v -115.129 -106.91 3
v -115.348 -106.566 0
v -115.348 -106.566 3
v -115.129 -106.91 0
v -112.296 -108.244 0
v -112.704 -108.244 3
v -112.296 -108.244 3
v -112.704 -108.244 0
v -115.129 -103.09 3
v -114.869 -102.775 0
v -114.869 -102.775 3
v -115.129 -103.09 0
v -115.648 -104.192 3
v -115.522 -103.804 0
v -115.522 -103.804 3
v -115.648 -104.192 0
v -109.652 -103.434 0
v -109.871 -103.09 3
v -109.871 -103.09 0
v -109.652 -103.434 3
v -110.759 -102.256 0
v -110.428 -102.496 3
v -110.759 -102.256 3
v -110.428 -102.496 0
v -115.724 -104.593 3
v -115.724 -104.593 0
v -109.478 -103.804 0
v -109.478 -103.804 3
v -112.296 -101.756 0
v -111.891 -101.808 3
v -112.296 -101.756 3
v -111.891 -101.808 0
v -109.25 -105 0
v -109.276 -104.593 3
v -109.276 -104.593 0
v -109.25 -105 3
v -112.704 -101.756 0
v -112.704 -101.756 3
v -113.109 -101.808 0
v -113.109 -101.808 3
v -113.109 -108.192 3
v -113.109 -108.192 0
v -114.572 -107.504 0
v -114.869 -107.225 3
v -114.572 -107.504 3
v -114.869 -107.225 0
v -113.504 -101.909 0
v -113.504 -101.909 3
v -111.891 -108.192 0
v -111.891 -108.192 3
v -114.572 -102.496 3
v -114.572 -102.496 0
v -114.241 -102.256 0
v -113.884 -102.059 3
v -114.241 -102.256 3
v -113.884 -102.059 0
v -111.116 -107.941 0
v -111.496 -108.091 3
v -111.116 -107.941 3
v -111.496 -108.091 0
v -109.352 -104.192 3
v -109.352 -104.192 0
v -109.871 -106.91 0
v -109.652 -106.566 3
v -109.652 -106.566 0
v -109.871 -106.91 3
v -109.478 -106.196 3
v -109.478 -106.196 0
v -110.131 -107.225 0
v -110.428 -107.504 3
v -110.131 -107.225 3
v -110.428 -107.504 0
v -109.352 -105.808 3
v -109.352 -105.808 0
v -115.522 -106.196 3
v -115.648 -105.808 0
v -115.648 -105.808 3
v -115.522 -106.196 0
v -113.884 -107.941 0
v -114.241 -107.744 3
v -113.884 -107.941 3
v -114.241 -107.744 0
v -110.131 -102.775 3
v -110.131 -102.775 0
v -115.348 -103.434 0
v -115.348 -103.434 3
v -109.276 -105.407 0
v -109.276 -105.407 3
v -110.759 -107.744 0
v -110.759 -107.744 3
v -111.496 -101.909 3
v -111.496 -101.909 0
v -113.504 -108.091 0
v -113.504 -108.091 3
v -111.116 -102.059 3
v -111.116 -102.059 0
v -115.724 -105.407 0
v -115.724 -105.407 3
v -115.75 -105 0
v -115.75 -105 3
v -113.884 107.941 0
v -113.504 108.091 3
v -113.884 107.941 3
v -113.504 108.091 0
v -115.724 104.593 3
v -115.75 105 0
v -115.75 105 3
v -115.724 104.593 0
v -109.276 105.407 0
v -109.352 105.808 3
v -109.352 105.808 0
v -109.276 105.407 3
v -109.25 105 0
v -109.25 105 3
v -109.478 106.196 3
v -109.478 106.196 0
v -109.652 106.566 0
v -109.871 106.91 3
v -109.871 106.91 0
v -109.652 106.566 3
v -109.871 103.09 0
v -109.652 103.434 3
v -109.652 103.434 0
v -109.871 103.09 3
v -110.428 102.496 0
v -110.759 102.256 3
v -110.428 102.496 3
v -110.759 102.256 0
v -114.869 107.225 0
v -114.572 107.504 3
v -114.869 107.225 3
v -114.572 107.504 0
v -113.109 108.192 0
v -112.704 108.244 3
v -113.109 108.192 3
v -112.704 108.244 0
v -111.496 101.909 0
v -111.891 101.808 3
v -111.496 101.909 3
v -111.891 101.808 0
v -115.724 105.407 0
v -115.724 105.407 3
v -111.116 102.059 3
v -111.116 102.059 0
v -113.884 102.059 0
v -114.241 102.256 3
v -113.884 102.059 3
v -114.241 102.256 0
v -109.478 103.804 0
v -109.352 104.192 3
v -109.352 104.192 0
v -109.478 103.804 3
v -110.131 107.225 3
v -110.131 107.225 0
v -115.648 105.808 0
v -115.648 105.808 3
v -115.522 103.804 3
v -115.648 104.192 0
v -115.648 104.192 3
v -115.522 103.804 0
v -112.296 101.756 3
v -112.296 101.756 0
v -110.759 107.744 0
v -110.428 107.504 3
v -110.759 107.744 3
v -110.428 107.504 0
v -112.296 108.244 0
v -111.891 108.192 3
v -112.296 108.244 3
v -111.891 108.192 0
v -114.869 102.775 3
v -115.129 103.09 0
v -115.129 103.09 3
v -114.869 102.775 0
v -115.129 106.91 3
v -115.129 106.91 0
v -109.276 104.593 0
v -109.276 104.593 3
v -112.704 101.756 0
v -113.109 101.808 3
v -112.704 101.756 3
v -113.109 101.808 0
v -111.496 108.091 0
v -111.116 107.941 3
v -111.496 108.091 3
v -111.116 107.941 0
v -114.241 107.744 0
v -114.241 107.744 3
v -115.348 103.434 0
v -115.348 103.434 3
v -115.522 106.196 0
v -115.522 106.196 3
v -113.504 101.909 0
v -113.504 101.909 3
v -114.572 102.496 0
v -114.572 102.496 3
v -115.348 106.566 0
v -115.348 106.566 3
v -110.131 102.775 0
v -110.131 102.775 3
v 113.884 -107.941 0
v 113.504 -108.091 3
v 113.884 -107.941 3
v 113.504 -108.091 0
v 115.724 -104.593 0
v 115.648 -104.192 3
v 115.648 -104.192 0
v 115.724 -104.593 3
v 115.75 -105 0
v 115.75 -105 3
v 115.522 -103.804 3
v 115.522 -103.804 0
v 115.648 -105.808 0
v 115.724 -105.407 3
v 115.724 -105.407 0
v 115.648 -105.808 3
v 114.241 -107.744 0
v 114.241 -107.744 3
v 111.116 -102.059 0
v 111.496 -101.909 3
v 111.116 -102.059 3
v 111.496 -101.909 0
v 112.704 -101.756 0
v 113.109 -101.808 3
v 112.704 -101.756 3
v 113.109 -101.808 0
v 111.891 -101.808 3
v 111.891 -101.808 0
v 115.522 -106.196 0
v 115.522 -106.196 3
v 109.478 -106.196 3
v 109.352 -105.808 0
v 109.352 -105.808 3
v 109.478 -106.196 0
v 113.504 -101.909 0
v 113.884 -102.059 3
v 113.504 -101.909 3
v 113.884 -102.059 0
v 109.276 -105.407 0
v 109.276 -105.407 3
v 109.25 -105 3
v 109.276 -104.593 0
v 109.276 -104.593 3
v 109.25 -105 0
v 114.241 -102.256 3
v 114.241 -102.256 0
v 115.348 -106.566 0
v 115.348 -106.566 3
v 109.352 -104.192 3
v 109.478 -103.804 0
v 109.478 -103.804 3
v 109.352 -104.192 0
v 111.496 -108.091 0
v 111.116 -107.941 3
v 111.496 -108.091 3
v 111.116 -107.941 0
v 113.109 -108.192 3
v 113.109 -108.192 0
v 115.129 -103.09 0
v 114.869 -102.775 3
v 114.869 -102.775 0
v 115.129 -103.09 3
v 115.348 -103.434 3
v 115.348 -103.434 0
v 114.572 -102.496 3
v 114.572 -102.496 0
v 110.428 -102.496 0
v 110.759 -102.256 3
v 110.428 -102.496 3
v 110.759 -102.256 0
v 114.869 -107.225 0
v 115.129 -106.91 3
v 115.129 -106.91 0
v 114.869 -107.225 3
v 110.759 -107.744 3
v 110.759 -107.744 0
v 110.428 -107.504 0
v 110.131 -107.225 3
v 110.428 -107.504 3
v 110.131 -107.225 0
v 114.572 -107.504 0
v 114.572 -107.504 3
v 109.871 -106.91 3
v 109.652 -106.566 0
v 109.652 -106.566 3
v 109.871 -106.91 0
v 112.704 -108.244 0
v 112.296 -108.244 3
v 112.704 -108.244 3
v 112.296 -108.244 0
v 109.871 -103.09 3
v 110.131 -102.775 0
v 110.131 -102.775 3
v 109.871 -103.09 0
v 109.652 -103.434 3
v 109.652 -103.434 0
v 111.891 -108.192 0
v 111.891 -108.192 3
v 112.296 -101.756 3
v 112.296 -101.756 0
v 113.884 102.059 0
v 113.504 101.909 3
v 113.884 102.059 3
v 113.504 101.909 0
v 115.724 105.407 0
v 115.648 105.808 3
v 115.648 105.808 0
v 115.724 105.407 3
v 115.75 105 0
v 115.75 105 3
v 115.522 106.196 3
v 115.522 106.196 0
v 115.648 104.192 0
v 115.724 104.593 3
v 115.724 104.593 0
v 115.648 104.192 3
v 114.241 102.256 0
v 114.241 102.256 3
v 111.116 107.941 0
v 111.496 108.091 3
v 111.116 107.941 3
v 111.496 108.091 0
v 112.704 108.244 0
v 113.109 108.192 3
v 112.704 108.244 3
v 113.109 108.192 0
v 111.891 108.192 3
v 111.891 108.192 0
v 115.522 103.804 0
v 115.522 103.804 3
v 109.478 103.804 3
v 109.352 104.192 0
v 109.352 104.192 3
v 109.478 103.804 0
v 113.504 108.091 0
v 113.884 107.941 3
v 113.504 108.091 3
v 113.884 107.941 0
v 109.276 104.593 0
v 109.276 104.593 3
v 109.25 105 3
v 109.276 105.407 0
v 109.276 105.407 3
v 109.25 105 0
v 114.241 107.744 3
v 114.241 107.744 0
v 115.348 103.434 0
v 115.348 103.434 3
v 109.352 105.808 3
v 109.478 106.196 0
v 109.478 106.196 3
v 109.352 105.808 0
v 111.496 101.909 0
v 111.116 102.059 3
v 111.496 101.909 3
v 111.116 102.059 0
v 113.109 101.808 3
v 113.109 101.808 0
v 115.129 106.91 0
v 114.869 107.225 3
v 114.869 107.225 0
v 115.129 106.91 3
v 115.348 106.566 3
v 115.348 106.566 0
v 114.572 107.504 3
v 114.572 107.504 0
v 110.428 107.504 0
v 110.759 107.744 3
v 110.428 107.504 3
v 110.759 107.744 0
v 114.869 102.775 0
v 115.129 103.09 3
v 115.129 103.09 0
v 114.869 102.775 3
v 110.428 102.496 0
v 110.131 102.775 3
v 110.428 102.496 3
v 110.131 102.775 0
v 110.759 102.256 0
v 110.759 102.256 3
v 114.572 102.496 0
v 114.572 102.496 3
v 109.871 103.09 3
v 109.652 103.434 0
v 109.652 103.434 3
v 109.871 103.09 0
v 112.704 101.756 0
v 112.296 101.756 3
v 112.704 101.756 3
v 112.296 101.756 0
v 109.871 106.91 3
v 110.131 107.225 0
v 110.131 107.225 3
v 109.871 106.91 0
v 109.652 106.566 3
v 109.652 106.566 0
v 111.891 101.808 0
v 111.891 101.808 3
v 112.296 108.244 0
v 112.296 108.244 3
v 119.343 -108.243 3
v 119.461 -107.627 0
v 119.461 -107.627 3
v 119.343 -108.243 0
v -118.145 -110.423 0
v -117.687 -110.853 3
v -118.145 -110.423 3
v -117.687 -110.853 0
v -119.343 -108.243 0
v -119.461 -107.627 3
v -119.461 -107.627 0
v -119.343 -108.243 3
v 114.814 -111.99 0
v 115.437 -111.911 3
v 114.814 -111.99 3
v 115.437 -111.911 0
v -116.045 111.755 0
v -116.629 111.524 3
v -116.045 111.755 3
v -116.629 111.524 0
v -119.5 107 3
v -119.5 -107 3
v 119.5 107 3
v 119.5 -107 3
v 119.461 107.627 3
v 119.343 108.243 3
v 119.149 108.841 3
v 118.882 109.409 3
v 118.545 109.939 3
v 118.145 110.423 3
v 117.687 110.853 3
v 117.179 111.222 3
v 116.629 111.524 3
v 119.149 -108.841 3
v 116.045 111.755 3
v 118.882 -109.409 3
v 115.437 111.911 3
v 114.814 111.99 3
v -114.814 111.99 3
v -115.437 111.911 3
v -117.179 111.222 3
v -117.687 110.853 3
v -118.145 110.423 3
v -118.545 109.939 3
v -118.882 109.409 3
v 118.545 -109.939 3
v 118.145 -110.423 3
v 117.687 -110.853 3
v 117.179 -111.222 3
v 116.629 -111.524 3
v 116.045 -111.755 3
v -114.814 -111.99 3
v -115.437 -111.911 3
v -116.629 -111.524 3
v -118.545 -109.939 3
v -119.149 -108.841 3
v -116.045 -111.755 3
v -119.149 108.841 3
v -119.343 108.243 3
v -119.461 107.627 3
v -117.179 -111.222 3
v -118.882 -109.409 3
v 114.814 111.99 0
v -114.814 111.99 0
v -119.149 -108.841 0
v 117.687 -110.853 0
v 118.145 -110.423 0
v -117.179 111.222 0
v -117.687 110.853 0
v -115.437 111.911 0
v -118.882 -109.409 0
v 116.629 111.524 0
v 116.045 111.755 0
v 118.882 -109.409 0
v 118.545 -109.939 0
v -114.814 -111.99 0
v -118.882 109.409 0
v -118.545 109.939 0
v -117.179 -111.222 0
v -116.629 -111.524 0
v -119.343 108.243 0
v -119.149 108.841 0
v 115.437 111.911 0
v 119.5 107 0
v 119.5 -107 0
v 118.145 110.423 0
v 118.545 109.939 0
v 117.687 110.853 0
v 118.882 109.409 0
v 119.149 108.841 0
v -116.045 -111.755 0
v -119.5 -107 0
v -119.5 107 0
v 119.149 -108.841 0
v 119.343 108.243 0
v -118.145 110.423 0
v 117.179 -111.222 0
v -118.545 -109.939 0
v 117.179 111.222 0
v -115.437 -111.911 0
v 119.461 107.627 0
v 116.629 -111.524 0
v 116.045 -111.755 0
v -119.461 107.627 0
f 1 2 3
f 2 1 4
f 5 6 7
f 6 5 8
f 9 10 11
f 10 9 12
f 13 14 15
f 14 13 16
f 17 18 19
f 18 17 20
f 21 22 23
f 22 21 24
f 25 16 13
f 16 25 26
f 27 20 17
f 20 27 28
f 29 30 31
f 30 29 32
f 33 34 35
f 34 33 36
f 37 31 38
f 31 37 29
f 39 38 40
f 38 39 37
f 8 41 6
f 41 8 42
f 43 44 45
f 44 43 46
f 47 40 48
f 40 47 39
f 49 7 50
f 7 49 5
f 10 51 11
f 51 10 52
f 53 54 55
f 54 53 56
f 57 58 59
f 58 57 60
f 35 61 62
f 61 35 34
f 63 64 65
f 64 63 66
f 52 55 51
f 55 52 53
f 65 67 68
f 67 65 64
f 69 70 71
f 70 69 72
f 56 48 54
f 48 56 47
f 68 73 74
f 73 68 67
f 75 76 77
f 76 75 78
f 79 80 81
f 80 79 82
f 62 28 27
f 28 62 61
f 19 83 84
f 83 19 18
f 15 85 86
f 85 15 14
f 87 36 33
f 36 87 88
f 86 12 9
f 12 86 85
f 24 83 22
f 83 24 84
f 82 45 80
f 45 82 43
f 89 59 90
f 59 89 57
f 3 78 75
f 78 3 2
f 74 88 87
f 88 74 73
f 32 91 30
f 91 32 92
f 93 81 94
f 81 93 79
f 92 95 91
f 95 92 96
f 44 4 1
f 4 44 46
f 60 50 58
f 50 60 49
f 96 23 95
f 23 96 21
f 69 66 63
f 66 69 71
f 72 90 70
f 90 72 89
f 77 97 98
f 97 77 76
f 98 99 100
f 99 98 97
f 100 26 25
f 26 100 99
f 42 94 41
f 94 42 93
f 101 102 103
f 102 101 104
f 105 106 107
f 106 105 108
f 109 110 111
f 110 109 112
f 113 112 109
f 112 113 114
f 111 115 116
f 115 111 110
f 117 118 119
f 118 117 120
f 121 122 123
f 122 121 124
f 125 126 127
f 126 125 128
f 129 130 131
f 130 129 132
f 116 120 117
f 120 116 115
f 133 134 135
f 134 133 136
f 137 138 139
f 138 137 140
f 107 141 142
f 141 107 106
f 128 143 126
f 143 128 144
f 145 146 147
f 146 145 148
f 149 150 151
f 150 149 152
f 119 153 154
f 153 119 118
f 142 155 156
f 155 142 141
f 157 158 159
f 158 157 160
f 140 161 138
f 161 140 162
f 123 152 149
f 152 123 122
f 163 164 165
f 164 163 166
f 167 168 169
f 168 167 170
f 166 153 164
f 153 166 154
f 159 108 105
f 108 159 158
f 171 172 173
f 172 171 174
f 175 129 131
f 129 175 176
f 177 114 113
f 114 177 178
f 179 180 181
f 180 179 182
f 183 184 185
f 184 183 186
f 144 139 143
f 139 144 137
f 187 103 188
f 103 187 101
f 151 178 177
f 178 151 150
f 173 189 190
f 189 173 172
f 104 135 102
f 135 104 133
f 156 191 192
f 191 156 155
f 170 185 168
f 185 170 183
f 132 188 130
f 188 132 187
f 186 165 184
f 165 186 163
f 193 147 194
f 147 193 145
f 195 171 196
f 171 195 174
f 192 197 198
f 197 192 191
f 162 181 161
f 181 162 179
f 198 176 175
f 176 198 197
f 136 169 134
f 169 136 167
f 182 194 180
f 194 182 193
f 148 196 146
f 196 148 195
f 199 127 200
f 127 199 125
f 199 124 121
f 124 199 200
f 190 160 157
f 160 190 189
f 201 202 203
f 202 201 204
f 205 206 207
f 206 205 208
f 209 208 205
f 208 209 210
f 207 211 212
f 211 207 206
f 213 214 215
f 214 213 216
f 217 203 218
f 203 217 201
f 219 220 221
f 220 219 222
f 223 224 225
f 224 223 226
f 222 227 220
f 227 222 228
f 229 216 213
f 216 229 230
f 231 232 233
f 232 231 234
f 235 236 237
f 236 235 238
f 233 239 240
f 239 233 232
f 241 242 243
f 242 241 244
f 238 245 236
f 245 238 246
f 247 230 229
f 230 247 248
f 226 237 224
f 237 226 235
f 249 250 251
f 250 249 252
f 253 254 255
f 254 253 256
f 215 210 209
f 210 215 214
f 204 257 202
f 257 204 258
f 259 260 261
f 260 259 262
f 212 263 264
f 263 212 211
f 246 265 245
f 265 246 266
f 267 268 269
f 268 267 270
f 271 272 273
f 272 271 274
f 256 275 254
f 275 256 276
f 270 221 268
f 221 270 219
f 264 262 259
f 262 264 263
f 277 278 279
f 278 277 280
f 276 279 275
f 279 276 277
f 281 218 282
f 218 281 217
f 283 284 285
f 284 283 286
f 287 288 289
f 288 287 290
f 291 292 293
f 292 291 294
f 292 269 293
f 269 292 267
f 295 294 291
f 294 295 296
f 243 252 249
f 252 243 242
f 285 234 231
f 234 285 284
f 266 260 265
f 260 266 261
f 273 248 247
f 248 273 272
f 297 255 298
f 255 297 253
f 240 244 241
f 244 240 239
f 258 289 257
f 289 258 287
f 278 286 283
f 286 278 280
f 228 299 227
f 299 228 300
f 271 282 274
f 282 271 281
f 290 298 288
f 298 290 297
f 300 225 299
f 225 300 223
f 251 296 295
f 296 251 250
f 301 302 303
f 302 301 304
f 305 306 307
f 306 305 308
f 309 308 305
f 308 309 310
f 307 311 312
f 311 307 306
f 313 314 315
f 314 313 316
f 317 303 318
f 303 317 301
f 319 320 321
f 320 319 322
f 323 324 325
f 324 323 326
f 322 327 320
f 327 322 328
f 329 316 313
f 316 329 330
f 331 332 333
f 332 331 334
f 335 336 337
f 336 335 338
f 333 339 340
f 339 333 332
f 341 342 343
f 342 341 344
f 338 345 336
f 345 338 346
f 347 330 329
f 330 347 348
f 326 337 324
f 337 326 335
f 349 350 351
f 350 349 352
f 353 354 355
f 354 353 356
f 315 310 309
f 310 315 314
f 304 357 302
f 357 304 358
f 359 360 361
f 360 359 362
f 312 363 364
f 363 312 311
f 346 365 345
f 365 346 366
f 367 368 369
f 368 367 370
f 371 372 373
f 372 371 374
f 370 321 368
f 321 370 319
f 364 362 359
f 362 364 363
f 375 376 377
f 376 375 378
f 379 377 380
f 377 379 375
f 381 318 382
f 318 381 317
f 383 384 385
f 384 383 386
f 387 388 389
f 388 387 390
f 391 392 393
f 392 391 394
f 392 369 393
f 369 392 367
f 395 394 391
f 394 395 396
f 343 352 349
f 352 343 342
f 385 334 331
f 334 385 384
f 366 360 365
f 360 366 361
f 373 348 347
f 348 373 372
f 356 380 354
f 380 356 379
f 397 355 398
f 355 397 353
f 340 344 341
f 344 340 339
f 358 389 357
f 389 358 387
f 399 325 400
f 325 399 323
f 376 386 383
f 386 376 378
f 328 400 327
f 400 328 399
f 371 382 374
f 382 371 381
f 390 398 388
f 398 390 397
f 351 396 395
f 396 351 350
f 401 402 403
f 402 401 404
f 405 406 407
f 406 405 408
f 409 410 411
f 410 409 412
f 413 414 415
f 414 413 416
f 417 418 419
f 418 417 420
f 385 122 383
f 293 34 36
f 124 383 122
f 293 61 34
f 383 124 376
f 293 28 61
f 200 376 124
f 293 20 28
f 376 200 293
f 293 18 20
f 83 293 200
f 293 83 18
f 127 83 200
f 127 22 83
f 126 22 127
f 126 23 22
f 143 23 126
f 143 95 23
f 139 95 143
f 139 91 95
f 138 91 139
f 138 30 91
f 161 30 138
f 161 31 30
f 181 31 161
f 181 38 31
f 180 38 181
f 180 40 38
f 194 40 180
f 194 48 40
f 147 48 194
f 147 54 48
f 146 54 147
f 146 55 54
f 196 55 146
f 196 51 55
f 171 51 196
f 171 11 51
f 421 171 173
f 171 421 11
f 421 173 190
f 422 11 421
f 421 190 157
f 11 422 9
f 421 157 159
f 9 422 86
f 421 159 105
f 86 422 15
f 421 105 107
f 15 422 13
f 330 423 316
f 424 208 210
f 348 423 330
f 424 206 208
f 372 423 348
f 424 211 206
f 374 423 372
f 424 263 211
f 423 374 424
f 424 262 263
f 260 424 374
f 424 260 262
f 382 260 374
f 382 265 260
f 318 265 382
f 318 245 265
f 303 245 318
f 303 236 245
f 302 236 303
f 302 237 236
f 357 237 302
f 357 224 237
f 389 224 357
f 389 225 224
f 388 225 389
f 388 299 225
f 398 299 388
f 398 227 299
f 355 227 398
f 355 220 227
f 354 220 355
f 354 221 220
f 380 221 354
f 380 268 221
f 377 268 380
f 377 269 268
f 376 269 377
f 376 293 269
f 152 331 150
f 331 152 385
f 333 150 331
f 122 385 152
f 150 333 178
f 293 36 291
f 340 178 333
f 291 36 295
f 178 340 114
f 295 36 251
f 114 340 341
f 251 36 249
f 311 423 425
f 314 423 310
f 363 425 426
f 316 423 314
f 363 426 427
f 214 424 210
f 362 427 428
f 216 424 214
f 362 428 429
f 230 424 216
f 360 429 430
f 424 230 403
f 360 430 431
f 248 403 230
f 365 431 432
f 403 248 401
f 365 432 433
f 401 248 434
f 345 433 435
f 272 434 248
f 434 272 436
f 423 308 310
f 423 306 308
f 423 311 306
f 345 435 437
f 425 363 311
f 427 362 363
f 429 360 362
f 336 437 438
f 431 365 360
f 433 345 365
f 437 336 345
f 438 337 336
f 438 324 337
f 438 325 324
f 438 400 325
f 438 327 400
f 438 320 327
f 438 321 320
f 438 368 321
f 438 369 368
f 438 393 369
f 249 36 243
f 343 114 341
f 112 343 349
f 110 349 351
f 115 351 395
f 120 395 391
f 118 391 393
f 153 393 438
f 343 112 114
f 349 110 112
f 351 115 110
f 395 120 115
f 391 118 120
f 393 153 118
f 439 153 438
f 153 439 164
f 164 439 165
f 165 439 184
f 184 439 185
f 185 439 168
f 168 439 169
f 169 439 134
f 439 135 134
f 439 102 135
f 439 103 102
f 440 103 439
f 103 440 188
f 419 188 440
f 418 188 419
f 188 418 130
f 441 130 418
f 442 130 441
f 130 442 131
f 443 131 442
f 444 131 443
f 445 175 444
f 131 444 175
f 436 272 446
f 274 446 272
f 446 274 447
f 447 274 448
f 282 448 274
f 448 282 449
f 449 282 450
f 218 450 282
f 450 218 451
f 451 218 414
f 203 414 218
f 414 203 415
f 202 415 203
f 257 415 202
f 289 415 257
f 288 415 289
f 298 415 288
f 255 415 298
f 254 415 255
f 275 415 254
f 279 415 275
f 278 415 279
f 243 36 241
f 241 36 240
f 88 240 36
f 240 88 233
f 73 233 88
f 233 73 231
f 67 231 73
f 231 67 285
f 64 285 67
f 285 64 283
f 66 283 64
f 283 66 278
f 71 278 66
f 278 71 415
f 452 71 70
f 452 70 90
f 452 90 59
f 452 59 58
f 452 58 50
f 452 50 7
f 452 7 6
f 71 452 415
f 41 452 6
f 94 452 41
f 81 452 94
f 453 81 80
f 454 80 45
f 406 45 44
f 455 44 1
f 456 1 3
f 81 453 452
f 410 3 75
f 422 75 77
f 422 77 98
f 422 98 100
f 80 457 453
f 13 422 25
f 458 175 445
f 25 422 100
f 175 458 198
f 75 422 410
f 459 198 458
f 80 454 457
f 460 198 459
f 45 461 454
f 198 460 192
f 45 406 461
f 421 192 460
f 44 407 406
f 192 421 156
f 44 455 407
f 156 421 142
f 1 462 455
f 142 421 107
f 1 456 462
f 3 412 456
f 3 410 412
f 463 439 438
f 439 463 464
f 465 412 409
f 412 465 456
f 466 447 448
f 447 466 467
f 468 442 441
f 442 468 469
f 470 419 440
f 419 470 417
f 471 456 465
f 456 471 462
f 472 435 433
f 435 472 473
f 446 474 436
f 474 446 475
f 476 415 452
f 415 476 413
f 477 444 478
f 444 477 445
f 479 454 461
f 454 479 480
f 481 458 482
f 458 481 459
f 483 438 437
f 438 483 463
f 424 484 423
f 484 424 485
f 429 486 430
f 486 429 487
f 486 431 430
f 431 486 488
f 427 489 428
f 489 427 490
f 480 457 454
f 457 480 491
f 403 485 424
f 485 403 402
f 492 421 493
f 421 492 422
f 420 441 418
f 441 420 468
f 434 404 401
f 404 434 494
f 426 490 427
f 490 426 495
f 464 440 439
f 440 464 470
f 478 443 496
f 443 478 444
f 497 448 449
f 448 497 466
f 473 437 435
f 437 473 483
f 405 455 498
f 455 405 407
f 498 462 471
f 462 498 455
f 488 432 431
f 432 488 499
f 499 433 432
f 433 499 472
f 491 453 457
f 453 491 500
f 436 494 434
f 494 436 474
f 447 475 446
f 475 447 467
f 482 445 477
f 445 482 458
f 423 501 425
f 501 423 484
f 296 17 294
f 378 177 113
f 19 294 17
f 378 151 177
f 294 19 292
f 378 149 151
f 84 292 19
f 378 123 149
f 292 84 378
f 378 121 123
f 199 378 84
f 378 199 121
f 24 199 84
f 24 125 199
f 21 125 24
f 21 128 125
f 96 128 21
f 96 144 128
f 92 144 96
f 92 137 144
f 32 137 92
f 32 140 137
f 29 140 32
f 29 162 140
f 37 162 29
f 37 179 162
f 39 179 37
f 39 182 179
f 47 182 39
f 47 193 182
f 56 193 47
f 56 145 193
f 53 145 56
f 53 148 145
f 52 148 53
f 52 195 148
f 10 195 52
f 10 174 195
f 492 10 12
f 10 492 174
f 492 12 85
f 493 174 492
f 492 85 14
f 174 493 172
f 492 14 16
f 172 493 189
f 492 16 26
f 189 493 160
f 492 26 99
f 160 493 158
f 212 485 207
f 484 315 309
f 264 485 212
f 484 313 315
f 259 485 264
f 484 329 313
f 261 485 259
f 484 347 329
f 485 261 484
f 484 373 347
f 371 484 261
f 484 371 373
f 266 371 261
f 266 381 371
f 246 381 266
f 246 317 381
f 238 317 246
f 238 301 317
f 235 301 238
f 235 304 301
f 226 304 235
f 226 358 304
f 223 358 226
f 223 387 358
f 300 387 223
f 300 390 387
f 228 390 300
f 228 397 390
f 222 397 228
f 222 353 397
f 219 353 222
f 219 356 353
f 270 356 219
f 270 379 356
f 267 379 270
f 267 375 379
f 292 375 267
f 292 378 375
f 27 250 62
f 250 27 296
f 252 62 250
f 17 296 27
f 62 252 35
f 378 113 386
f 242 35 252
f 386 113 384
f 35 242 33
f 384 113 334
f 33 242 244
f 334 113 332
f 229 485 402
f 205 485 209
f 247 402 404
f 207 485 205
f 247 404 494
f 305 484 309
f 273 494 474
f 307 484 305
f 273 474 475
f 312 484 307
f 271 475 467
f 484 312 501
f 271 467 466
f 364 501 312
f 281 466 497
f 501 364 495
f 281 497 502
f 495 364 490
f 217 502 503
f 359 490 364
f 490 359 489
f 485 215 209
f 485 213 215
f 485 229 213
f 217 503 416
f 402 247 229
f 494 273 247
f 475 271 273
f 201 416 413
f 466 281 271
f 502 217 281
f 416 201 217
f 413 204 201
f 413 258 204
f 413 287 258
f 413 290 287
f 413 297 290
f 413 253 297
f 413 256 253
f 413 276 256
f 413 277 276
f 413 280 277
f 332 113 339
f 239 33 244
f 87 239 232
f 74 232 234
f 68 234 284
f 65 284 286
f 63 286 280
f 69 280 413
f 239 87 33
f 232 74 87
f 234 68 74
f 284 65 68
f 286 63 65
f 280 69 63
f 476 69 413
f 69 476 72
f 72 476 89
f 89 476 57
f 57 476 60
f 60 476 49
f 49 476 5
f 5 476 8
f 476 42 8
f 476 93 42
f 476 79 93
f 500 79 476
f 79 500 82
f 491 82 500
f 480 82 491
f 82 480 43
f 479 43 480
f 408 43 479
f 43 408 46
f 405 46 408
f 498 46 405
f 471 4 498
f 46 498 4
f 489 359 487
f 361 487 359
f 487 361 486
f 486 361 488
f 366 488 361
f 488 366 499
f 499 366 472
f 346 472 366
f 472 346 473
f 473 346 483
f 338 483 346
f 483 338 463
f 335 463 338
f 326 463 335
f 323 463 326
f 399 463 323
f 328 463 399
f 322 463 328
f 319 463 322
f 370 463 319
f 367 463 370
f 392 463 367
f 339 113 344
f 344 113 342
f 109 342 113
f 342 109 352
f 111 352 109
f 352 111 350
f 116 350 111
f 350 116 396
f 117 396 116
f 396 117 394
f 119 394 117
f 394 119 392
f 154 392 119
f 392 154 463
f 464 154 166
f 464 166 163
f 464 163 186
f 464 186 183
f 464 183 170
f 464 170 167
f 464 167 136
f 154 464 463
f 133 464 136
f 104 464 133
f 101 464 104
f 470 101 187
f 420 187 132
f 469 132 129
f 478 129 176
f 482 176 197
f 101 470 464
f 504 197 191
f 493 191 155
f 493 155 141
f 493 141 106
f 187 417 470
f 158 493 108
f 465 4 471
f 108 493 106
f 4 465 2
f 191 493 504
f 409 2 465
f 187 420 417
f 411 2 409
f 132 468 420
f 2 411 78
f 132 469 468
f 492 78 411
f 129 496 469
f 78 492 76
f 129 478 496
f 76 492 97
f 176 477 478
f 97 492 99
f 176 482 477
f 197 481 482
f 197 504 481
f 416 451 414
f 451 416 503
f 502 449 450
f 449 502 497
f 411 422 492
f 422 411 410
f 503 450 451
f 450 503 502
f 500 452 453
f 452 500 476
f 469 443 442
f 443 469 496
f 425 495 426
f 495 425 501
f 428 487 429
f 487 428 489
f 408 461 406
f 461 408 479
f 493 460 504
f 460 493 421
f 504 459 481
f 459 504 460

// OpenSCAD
$fn = 50;


difference() {
	union() {
		hull() {
			translate(v = [-114.5000000000, 107.0000000000, 0]) {
				cylinder(h = 3, r = 5);
			}
			translate(v = [114.5000000000, 107.0000000000, 0]) {
				cylinder(h = 3, r = 5);
			}
			translate(v = [-114.5000000000, -107.0000000000, 0]) {
				cylinder(h = 3, r = 5);
			}
			translate(v = [114.5000000000, -107.0000000000, 0]) {
				cylinder(h = 3, r = 5);
			}
		}
	}
	union() {
		translate(v = [-112.5000000000, -105.0000000000, -100.0000000000]) {
			cylinder(h = 200, r = 3.2500000000);
		}
		translate(v = [-112.5000000000, 105.0000000000, -100.0000000000]) {
			cylinder(h = 200, r = 3.2500000000);
		}
		translate(v = [112.5000000000, -105.0000000000, -100.0000000000]) {
			cylinder(h = 200, r = 3.2500000000);
		}
		translate(v = [112.5000000000, 105.0000000000, -100.0000000000]) {
			cylinder(h = 200, r = 3.2500000000);
		}
	}
}
